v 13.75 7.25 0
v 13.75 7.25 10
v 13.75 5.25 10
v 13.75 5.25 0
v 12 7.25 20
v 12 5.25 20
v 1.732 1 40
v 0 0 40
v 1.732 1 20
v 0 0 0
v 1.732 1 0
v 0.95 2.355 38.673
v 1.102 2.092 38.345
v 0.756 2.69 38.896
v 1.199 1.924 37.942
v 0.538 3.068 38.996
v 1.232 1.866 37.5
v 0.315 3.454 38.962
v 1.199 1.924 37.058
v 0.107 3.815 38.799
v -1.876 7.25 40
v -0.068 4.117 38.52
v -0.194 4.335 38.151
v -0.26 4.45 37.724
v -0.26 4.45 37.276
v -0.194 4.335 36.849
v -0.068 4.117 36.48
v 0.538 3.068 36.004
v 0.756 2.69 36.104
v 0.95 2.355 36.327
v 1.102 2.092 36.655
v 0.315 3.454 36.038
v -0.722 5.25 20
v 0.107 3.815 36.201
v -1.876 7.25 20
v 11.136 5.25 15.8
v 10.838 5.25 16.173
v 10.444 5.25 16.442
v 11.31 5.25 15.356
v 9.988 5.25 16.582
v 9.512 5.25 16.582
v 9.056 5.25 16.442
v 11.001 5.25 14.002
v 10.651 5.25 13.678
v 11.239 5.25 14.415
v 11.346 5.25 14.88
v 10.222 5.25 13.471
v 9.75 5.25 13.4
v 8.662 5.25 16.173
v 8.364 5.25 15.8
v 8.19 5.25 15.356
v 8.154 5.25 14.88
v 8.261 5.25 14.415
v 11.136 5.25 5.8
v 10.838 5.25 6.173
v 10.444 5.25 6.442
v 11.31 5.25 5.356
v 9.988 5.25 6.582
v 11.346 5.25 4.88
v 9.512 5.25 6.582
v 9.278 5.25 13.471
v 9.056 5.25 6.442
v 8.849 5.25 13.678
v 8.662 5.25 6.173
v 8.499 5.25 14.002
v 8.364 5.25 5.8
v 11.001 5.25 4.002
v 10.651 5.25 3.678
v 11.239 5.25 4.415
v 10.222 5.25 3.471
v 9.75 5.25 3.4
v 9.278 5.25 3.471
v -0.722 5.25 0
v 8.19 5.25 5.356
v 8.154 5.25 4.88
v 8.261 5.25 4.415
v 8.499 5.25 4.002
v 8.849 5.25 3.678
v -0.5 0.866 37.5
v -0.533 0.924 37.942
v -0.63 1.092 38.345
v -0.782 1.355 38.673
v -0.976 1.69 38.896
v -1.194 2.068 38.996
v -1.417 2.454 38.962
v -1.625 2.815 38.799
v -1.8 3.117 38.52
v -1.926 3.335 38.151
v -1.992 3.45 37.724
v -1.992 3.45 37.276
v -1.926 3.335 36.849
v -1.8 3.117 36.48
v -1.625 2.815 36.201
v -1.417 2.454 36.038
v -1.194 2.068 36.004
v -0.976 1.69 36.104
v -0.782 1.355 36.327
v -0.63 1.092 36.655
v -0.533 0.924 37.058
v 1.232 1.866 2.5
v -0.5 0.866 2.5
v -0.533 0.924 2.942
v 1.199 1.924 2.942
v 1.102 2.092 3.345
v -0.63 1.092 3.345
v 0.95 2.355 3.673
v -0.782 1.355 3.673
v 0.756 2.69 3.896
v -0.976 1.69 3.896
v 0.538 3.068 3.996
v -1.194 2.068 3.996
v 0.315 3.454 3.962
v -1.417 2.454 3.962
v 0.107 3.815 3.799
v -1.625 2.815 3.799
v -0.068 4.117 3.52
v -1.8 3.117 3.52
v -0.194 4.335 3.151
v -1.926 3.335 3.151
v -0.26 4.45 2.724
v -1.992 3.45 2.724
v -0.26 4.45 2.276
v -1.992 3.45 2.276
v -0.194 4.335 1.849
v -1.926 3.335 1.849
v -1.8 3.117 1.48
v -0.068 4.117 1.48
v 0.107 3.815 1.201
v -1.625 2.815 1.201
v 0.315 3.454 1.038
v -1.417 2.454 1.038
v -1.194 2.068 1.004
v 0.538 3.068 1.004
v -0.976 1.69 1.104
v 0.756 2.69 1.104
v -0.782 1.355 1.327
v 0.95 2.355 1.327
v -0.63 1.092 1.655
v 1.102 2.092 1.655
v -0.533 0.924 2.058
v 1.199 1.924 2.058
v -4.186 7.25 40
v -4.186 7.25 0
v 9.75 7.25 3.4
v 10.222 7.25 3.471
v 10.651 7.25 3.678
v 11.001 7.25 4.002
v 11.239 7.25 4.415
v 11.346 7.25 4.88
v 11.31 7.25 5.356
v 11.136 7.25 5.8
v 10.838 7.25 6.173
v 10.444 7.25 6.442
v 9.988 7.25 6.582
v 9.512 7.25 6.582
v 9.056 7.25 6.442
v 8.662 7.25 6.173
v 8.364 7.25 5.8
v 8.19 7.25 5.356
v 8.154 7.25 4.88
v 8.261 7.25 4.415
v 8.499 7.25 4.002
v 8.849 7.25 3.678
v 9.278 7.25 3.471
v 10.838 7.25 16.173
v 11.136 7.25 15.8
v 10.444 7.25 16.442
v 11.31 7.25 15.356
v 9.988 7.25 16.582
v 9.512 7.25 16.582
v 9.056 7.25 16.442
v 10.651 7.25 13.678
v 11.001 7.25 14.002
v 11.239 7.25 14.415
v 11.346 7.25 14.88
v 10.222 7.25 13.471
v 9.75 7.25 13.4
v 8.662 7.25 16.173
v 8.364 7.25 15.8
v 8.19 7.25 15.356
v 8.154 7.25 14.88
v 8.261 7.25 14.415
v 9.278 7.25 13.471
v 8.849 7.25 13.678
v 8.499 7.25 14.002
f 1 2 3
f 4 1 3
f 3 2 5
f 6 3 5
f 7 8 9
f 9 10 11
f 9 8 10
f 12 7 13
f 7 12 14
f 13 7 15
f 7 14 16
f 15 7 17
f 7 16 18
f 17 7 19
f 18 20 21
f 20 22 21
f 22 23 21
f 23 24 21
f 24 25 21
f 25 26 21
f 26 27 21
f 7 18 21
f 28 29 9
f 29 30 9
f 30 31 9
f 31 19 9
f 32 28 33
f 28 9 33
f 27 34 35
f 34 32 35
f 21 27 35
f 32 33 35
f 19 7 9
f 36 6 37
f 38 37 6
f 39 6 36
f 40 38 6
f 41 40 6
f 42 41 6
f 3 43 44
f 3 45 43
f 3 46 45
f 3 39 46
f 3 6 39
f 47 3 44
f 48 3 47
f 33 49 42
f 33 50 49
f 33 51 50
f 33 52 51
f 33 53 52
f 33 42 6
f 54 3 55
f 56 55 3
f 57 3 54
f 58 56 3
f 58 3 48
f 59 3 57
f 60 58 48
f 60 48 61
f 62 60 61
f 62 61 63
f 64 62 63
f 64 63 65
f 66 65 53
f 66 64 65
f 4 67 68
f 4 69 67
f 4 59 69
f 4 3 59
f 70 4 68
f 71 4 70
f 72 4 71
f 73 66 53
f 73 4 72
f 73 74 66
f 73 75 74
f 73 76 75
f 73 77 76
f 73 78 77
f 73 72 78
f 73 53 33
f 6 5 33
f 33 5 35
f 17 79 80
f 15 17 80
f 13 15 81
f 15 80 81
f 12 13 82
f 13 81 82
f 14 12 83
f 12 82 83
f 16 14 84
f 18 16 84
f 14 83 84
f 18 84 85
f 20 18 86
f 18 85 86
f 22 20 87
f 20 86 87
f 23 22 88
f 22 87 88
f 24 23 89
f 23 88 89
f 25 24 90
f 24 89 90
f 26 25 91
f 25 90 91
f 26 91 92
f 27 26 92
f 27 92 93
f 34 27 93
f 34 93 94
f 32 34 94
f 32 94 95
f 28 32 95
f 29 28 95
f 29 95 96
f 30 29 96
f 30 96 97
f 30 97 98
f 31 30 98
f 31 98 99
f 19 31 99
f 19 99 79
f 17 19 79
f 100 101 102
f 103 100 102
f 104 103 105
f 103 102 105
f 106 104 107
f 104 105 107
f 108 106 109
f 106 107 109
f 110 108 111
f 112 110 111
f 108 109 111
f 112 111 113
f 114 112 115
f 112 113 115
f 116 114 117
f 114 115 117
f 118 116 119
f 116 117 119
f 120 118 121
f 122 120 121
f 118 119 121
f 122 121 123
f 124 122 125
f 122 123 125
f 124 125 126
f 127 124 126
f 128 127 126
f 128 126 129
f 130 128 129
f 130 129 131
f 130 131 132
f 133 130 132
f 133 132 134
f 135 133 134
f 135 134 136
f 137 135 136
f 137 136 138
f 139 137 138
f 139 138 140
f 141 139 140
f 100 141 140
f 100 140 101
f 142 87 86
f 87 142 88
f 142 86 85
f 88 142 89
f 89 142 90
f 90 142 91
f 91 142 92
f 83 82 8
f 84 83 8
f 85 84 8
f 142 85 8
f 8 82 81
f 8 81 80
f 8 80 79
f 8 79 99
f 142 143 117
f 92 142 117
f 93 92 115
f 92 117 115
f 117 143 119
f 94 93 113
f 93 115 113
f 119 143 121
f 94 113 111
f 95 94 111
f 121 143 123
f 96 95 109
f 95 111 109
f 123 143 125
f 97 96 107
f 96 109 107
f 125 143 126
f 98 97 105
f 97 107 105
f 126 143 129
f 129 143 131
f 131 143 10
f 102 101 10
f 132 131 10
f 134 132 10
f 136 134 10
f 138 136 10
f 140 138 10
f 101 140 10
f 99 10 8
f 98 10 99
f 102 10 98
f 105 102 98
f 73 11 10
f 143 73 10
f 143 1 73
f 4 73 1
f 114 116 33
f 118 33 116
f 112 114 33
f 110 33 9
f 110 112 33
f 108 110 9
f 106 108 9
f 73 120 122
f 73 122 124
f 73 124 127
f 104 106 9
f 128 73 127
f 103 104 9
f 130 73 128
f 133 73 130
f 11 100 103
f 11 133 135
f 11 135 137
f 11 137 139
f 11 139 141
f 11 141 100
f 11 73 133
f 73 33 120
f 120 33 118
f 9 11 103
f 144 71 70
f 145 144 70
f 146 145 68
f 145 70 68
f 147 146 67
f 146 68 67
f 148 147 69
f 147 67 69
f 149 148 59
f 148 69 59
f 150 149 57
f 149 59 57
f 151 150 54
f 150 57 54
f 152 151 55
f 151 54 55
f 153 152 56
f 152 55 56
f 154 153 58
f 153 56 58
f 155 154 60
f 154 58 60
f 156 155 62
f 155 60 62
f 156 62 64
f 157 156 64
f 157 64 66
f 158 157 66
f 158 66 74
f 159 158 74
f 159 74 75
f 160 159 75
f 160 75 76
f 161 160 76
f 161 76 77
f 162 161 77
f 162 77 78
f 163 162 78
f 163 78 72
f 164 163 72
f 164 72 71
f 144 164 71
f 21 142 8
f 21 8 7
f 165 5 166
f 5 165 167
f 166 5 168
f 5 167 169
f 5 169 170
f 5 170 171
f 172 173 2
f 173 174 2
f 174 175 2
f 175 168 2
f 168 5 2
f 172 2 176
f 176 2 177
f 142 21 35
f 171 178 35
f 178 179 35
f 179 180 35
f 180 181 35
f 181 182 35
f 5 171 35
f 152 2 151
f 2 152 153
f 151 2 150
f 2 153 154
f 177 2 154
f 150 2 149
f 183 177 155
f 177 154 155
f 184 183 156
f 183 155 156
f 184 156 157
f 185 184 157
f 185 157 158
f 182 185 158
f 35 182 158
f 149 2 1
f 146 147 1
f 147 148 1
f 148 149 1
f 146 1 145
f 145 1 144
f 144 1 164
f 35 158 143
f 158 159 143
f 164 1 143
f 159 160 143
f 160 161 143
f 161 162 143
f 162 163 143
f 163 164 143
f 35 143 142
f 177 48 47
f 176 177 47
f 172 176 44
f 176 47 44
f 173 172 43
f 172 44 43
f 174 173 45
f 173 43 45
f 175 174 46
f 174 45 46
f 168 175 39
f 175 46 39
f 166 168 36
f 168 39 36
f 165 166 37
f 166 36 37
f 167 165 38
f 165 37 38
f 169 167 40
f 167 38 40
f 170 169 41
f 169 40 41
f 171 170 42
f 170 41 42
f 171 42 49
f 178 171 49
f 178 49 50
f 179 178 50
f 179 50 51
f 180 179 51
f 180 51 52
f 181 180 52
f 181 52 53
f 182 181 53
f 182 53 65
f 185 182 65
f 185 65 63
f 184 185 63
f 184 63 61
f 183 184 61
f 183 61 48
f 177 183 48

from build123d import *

# Parameters (mm, degrees)
BOSS_EXTRUDE1_DEPTH = 20
BOSS_EXTRUDE2_DEPTH = 20
CUT_EXTRUDE1_REACH  = 44.914
SKETCH3_R           = 1.5
SKETCH4_R           = 1.6
CUT_EXTRUDE2_DEPTH  = 43.62188405
CUT_EXTRUDE3_DEPTH  = 43.914158503


with BuildPart() as part:
    # Sketch1 → Boss-Extrude1 (new body)
    with BuildSketch(Plane.XY):
        Polygon((0, 0), (-4.185789452, 7.25), (13.75, 7.25), (13.75, 5.25), (-0.721687836, 5.25), (1.732050808, 1), align=None)
    extrude(amount=BOSS_EXTRUDE1_DEPTH)

    # Sketch2 → Boss-Extrude2 (add)
    with BuildSketch(Plane.XY.offset(20)):
        Polygon((-4.185789452, 7.25), (0, 0), (1.732050808, 1), (-1.876388375, 7.25), align=None)
    extrude(amount=BOSS_EXTRUDE2_DEPTH)

    # Sketch3 → Cut-Extrude1 (cut, up to next)
    with BuildSketch(Plane(origin=(0, 0, 0), x_dir=(0, 0, 1), z_dir=(-0.8660254037844363, -0.5000000000000042, 0)), mode=Mode.PRIVATE) as cut_extrude1_sk1:
        with Locations((2.5, 2.5)):
            Circle(SKETCH3_R)
    cut_extrude1_tool1 = extrude(cut_extrude1_sk1.sketch, amount=-CUT_EXTRUDE1_REACH, mode=Mode.PRIVATE) & part.part
    # Sketch3 → Cut-Extrude1 (cut, up to next)
    with BuildSketch(Plane(origin=(0, 0, 0), x_dir=(0, 0, 1), z_dir=(-0.8660254037844363, -0.5000000000000042, 0)), mode=Mode.PRIVATE) as cut_extrude1_sk2:
        with Locations((37.5, 2.5)):
            Circle(SKETCH3_R)
    cut_extrude1_tool2 = extrude(cut_extrude1_sk2.sketch, amount=-CUT_EXTRUDE1_REACH, mode=Mode.PRIVATE) & part.part
    add(cut_extrude1_tool1.solids().sort_by_distance((-1.25, 2.165064, 2.5))[0], mode=Mode.SUBTRACT)
    add(cut_extrude1_tool2.solids().sort_by_distance((-1.25, 2.165064, 37.5))[0], mode=Mode.SUBTRACT)

    # Sketch4 → Cut-Extrude2 (cut, through all)
    with BuildSketch(Plane.XZ.offset(-5.25)):
        with Locations((9.75, 15)):
            Circle(SKETCH4_R)
        with Locations((9.75, 5)):
            Circle(SKETCH4_R)
    extrude(amount=-CUT_EXTRUDE2_DEPTH, mode=Mode.SUBTRACT)

    # Sketch5 → Cut-Extrude3 (cut, through all)
    with BuildSketch(Plane(origin=(0, 7.25, 0), x_dir=(1, 0, 0), z_dir=(0, 1, 0))):
        Polygon((13.75, -20), (13.75, -10), (12, -20), align=None)
    extrude(amount=-CUT_EXTRUDE3_DEPTH, mode=Mode.SUBTRACT)


solid = part.part
